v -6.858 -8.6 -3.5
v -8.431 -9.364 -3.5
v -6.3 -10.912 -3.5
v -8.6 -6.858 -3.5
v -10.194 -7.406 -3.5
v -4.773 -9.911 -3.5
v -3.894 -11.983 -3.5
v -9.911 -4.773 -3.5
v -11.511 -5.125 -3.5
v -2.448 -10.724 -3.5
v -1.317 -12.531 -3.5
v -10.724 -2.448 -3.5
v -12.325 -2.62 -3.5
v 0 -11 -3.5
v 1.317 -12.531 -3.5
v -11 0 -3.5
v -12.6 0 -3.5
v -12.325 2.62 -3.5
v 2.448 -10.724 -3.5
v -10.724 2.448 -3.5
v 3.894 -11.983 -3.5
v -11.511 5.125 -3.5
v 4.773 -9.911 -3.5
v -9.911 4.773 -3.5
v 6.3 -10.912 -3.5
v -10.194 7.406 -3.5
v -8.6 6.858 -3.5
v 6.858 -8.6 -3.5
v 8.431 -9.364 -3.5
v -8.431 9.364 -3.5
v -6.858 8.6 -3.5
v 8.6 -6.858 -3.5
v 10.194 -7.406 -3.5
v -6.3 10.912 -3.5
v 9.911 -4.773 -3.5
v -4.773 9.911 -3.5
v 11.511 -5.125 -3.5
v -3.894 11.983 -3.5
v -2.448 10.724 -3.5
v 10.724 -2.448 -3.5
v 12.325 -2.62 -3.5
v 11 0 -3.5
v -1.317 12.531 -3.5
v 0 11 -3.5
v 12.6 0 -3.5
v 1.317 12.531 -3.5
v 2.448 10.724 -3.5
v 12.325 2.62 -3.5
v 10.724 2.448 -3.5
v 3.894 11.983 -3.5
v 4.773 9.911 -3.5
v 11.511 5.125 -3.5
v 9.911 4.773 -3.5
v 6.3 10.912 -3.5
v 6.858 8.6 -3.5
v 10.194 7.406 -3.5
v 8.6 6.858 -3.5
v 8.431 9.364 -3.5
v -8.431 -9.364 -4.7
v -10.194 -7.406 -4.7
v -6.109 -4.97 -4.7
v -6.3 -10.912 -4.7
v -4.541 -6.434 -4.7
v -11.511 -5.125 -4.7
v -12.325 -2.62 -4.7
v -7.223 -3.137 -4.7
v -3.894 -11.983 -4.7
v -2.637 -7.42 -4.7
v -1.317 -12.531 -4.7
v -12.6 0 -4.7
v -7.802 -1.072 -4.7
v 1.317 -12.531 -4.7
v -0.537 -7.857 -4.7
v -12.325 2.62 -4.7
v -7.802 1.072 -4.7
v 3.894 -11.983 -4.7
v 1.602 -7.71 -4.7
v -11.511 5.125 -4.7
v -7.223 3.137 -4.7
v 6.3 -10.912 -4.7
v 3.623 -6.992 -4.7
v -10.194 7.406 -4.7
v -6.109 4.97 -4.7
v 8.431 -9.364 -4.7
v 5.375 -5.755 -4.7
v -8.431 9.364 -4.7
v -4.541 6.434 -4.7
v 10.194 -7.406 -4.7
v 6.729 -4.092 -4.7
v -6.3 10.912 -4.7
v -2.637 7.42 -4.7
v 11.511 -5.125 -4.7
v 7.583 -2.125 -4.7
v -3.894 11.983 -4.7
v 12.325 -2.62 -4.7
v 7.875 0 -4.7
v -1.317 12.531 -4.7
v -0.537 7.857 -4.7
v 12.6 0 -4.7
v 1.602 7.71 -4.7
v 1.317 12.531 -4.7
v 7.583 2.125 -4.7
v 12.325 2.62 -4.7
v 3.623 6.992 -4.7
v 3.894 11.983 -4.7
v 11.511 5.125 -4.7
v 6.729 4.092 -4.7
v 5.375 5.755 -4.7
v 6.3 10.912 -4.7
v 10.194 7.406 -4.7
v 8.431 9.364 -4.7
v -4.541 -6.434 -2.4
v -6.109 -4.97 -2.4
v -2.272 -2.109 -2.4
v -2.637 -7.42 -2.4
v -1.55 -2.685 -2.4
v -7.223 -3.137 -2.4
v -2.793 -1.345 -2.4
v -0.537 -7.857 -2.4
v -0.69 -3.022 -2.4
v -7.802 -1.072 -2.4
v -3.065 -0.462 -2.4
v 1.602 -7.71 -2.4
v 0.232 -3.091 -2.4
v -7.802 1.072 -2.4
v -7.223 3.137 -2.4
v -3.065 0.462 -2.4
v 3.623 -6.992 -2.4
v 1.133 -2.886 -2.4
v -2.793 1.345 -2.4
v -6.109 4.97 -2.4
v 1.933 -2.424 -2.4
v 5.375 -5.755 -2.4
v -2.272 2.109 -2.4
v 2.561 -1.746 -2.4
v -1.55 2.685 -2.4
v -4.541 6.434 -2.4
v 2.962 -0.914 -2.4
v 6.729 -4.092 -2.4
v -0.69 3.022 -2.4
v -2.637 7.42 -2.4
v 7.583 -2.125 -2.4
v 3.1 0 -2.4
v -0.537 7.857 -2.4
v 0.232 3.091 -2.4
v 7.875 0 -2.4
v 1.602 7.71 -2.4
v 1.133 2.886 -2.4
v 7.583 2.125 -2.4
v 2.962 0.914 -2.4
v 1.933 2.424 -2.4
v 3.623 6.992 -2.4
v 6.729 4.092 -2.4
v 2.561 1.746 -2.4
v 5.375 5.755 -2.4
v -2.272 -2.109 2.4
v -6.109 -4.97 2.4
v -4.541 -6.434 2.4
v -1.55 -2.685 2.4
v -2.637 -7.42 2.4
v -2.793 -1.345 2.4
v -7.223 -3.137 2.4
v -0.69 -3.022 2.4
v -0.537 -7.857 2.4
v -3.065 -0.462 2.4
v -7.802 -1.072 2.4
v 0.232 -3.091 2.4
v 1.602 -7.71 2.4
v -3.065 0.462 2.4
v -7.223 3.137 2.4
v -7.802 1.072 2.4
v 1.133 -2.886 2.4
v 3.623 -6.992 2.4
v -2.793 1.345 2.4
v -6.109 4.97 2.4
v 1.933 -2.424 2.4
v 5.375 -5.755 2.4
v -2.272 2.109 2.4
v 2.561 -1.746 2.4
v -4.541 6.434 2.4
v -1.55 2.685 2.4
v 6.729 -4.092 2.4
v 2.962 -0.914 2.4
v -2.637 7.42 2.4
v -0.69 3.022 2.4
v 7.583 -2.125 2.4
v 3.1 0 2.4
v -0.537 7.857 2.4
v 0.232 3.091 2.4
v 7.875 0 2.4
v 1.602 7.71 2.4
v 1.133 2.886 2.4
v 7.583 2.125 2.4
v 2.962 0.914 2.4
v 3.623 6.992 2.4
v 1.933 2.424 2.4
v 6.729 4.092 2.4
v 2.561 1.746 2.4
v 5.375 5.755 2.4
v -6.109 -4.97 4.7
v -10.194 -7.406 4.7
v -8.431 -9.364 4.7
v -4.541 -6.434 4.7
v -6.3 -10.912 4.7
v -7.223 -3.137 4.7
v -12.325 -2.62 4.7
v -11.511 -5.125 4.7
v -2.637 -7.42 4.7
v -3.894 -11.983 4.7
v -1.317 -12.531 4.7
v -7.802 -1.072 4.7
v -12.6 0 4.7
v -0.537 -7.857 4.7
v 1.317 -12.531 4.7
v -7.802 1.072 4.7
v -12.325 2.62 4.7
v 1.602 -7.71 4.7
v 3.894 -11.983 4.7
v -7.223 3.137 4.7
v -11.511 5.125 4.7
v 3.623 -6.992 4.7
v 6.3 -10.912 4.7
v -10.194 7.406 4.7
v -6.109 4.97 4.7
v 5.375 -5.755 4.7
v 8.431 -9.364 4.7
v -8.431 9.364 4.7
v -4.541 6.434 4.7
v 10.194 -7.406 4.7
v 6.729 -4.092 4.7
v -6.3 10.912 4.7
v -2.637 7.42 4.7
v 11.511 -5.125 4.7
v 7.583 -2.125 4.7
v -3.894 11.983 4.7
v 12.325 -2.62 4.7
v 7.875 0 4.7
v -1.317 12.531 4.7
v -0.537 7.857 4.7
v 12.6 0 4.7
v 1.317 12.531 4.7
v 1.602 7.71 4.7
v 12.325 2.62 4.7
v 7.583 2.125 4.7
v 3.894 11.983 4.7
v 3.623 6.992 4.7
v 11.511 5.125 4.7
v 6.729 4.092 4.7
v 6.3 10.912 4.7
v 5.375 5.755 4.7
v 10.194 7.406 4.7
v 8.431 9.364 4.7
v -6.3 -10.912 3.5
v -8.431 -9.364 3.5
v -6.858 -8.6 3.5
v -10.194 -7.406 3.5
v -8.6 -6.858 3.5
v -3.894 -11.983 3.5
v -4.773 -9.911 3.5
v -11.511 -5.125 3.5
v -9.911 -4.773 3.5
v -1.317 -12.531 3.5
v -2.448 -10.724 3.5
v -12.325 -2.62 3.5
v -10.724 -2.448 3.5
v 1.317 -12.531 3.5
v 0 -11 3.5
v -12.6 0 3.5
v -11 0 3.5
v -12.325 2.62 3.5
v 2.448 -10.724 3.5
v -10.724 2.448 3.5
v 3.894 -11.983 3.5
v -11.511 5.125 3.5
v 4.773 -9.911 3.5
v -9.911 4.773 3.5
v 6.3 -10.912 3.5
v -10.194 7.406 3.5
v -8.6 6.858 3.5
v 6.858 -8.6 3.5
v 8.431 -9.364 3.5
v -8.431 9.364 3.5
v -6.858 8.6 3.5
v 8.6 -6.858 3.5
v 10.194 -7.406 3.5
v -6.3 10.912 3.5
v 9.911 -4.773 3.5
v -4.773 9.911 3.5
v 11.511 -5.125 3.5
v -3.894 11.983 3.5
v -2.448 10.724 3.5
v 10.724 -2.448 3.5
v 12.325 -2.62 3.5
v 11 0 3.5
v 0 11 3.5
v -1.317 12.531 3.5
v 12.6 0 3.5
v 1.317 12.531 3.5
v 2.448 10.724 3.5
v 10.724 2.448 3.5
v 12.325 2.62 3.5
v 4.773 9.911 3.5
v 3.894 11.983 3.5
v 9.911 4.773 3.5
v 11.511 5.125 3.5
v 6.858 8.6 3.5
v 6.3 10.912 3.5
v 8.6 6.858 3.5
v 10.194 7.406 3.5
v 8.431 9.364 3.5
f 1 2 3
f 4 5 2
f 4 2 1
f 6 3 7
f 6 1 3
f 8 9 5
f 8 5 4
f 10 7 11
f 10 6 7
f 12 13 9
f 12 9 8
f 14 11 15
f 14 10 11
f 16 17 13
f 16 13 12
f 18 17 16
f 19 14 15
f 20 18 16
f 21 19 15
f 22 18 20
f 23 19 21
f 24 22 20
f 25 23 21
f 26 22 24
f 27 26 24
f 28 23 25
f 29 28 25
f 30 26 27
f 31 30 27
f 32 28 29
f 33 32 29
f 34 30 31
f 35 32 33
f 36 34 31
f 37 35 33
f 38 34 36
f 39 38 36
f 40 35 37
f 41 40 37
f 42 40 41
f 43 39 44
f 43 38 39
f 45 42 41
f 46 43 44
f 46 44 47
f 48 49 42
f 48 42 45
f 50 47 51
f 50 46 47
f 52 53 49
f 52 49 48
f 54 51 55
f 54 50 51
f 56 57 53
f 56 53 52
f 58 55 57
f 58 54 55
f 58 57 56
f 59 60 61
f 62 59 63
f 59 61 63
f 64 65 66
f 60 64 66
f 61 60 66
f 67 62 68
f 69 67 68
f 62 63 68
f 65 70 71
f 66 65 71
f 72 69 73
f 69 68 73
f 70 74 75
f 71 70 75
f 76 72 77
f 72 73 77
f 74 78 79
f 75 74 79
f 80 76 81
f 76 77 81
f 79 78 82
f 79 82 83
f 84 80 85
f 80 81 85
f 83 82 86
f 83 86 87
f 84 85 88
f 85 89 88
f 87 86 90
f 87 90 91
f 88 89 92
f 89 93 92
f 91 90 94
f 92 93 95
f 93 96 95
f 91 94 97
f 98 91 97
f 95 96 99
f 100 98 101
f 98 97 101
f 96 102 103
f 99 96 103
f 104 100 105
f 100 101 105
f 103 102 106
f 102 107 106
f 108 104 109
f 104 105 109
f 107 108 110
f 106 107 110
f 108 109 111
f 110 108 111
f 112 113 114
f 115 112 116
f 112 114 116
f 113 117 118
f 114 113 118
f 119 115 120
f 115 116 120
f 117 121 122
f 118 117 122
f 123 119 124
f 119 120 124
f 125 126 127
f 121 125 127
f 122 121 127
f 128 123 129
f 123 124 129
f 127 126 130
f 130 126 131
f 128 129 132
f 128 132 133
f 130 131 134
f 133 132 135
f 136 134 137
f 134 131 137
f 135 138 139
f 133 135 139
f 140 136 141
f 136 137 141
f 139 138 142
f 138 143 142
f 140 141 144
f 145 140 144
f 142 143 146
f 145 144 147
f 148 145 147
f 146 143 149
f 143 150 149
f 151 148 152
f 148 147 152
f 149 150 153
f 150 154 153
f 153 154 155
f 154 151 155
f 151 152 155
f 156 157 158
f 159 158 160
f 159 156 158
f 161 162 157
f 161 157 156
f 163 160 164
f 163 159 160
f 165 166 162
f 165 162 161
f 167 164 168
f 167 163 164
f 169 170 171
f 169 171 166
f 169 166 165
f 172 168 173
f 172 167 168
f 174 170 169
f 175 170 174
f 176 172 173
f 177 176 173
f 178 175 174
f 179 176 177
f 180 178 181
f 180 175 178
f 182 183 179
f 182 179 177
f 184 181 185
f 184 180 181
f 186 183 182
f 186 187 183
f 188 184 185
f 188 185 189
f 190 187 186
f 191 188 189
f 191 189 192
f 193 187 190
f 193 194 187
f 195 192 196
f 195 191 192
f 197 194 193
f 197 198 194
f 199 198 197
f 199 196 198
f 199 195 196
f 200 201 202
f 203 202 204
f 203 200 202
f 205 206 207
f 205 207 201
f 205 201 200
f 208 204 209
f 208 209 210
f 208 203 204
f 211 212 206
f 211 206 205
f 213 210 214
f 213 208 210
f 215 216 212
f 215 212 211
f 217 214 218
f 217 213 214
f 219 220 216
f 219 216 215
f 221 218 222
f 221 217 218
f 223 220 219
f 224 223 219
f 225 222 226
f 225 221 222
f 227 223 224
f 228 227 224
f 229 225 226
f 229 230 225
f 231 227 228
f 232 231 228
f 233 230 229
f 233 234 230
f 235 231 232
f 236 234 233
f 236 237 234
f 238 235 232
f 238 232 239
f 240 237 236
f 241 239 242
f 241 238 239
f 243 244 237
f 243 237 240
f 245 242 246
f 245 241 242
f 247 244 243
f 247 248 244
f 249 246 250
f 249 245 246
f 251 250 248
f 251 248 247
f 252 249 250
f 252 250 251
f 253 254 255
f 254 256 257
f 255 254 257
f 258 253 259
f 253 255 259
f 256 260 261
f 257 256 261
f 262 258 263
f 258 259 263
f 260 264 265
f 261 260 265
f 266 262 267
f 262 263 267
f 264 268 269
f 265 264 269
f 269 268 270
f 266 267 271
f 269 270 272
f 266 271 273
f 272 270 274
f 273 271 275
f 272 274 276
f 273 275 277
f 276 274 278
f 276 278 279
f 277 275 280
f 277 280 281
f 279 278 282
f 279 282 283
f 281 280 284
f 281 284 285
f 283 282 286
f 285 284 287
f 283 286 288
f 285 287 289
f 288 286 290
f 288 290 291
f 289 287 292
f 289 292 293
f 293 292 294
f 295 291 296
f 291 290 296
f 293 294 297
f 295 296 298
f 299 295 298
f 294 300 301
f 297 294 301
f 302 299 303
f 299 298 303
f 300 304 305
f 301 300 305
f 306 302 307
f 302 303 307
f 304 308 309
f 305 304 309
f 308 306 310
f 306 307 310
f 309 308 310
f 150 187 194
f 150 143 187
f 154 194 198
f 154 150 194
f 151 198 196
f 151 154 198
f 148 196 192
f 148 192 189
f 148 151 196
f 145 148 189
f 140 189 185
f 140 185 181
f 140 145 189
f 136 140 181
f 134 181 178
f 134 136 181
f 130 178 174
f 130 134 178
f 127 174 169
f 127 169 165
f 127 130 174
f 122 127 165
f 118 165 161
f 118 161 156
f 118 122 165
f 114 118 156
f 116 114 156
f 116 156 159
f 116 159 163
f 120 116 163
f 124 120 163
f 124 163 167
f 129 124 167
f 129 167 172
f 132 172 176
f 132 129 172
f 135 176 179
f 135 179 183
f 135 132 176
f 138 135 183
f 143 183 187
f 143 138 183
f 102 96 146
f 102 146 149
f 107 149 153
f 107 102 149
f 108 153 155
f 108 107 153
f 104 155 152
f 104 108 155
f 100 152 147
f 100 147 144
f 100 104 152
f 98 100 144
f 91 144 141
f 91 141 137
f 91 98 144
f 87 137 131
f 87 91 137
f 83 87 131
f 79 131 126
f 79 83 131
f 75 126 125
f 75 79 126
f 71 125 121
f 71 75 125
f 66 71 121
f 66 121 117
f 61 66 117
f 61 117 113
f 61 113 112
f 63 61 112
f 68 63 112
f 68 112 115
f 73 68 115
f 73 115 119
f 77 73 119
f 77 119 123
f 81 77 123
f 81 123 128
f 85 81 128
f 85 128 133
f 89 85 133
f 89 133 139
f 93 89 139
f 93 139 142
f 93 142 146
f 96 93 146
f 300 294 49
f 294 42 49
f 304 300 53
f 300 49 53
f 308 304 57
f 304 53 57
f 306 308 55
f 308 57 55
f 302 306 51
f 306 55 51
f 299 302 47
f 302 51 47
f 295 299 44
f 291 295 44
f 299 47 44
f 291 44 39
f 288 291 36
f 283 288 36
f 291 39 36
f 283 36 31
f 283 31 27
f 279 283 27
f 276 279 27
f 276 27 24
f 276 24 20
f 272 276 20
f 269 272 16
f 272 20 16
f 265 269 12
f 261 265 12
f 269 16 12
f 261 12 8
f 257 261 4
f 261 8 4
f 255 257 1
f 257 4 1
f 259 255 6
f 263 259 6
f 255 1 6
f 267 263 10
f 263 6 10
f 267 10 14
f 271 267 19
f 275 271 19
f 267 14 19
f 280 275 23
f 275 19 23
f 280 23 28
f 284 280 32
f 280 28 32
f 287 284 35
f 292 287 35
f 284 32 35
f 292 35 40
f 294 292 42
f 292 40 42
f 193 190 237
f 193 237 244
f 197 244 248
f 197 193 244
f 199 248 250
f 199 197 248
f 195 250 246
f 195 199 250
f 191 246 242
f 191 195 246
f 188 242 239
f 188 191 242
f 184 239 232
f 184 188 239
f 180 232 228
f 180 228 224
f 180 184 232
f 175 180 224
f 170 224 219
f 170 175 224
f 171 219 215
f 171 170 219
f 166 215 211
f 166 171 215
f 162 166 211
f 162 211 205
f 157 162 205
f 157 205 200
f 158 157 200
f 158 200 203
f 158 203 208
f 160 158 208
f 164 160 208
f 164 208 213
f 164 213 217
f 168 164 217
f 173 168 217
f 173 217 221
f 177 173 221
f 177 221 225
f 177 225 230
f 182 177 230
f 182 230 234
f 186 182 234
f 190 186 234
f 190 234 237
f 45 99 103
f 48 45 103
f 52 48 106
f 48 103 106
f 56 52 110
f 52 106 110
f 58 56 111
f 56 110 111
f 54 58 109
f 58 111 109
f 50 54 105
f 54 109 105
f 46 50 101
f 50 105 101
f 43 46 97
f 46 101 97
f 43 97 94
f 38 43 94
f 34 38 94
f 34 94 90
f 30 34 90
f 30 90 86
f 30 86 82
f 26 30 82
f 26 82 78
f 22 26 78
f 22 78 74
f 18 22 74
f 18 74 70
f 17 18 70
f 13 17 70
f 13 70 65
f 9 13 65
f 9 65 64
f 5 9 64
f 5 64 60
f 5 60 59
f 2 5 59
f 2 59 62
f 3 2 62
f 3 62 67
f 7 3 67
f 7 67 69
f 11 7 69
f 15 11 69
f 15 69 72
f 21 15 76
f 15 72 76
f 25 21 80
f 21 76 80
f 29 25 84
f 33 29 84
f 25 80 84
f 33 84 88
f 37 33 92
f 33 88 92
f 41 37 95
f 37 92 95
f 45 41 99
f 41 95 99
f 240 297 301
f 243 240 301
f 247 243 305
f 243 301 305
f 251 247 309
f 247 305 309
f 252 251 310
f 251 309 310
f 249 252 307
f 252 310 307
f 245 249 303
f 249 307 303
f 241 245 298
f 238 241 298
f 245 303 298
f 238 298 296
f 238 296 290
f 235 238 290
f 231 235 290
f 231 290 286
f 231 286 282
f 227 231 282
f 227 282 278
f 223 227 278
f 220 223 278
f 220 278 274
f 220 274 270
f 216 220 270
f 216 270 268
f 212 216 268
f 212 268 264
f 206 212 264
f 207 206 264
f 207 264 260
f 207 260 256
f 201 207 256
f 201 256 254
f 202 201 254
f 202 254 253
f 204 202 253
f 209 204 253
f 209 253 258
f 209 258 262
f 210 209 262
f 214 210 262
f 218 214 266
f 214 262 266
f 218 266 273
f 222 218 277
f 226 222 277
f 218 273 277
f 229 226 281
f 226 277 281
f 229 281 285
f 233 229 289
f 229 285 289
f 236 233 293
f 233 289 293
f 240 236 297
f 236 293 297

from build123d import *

# Parameters (mm, degrees)
ESQUISSE2_R             = 7.875
ESQUISSE2_R_2           = 3.1
BOSS_EXTRU_1_DEPTH      = 2.4
BOSS_EXTRU_2_DEPTH      = 2.3
BOSS_EXTRU_2_DEPTH_BACK = 7.1
ESQUISSE3_R             = 12.6
ESQUISSE3_R_2           = 7.875
ESQUISSE4_R             = 12.6
ESQUISSE4_R_2           = 11
ENL_V_MAT_EXTRU_1_DEPTH = 3.5


with BuildPart() as part:
    # Esquisse2 → Boss.-Extru.1 (new, symmetric)
    with BuildSketch(Plane.XY):
        Circle(ESQUISSE2_R)
        Circle(ESQUISSE2_R_2, mode=Mode.SUBTRACT)
    extrude(amount=BOSS_EXTRU_1_DEPTH, both=True)

    # Esquisse3 → Boss.-Extru.2 (add, two sides: drawn at the far end of the back side and taken through both)
    with BuildSketch(Plane.XY.offset(2.4).offset(-BOSS_EXTRU_2_DEPTH_BACK)):
        Circle(ESQUISSE3_R)
        Circle(ESQUISSE3_R_2, mode=Mode.SUBTRACT)
    extrude(amount=BOSS_EXTRU_2_DEPTH + BOSS_EXTRU_2_DEPTH_BACK)

    # Esquisse4 → Enlèv. mat.-Extru.1 (cut, symmetric)
    with BuildSketch(Plane.XY):
        Circle(ESQUISSE4_R)
        Circle(ESQUISSE4_R_2, mode=Mode.SUBTRACT)
    extrude(amount=ENL_V_MAT_EXTRU_1_DEPTH, both=True, mode=Mode.SUBTRACT)


solid = part.part
